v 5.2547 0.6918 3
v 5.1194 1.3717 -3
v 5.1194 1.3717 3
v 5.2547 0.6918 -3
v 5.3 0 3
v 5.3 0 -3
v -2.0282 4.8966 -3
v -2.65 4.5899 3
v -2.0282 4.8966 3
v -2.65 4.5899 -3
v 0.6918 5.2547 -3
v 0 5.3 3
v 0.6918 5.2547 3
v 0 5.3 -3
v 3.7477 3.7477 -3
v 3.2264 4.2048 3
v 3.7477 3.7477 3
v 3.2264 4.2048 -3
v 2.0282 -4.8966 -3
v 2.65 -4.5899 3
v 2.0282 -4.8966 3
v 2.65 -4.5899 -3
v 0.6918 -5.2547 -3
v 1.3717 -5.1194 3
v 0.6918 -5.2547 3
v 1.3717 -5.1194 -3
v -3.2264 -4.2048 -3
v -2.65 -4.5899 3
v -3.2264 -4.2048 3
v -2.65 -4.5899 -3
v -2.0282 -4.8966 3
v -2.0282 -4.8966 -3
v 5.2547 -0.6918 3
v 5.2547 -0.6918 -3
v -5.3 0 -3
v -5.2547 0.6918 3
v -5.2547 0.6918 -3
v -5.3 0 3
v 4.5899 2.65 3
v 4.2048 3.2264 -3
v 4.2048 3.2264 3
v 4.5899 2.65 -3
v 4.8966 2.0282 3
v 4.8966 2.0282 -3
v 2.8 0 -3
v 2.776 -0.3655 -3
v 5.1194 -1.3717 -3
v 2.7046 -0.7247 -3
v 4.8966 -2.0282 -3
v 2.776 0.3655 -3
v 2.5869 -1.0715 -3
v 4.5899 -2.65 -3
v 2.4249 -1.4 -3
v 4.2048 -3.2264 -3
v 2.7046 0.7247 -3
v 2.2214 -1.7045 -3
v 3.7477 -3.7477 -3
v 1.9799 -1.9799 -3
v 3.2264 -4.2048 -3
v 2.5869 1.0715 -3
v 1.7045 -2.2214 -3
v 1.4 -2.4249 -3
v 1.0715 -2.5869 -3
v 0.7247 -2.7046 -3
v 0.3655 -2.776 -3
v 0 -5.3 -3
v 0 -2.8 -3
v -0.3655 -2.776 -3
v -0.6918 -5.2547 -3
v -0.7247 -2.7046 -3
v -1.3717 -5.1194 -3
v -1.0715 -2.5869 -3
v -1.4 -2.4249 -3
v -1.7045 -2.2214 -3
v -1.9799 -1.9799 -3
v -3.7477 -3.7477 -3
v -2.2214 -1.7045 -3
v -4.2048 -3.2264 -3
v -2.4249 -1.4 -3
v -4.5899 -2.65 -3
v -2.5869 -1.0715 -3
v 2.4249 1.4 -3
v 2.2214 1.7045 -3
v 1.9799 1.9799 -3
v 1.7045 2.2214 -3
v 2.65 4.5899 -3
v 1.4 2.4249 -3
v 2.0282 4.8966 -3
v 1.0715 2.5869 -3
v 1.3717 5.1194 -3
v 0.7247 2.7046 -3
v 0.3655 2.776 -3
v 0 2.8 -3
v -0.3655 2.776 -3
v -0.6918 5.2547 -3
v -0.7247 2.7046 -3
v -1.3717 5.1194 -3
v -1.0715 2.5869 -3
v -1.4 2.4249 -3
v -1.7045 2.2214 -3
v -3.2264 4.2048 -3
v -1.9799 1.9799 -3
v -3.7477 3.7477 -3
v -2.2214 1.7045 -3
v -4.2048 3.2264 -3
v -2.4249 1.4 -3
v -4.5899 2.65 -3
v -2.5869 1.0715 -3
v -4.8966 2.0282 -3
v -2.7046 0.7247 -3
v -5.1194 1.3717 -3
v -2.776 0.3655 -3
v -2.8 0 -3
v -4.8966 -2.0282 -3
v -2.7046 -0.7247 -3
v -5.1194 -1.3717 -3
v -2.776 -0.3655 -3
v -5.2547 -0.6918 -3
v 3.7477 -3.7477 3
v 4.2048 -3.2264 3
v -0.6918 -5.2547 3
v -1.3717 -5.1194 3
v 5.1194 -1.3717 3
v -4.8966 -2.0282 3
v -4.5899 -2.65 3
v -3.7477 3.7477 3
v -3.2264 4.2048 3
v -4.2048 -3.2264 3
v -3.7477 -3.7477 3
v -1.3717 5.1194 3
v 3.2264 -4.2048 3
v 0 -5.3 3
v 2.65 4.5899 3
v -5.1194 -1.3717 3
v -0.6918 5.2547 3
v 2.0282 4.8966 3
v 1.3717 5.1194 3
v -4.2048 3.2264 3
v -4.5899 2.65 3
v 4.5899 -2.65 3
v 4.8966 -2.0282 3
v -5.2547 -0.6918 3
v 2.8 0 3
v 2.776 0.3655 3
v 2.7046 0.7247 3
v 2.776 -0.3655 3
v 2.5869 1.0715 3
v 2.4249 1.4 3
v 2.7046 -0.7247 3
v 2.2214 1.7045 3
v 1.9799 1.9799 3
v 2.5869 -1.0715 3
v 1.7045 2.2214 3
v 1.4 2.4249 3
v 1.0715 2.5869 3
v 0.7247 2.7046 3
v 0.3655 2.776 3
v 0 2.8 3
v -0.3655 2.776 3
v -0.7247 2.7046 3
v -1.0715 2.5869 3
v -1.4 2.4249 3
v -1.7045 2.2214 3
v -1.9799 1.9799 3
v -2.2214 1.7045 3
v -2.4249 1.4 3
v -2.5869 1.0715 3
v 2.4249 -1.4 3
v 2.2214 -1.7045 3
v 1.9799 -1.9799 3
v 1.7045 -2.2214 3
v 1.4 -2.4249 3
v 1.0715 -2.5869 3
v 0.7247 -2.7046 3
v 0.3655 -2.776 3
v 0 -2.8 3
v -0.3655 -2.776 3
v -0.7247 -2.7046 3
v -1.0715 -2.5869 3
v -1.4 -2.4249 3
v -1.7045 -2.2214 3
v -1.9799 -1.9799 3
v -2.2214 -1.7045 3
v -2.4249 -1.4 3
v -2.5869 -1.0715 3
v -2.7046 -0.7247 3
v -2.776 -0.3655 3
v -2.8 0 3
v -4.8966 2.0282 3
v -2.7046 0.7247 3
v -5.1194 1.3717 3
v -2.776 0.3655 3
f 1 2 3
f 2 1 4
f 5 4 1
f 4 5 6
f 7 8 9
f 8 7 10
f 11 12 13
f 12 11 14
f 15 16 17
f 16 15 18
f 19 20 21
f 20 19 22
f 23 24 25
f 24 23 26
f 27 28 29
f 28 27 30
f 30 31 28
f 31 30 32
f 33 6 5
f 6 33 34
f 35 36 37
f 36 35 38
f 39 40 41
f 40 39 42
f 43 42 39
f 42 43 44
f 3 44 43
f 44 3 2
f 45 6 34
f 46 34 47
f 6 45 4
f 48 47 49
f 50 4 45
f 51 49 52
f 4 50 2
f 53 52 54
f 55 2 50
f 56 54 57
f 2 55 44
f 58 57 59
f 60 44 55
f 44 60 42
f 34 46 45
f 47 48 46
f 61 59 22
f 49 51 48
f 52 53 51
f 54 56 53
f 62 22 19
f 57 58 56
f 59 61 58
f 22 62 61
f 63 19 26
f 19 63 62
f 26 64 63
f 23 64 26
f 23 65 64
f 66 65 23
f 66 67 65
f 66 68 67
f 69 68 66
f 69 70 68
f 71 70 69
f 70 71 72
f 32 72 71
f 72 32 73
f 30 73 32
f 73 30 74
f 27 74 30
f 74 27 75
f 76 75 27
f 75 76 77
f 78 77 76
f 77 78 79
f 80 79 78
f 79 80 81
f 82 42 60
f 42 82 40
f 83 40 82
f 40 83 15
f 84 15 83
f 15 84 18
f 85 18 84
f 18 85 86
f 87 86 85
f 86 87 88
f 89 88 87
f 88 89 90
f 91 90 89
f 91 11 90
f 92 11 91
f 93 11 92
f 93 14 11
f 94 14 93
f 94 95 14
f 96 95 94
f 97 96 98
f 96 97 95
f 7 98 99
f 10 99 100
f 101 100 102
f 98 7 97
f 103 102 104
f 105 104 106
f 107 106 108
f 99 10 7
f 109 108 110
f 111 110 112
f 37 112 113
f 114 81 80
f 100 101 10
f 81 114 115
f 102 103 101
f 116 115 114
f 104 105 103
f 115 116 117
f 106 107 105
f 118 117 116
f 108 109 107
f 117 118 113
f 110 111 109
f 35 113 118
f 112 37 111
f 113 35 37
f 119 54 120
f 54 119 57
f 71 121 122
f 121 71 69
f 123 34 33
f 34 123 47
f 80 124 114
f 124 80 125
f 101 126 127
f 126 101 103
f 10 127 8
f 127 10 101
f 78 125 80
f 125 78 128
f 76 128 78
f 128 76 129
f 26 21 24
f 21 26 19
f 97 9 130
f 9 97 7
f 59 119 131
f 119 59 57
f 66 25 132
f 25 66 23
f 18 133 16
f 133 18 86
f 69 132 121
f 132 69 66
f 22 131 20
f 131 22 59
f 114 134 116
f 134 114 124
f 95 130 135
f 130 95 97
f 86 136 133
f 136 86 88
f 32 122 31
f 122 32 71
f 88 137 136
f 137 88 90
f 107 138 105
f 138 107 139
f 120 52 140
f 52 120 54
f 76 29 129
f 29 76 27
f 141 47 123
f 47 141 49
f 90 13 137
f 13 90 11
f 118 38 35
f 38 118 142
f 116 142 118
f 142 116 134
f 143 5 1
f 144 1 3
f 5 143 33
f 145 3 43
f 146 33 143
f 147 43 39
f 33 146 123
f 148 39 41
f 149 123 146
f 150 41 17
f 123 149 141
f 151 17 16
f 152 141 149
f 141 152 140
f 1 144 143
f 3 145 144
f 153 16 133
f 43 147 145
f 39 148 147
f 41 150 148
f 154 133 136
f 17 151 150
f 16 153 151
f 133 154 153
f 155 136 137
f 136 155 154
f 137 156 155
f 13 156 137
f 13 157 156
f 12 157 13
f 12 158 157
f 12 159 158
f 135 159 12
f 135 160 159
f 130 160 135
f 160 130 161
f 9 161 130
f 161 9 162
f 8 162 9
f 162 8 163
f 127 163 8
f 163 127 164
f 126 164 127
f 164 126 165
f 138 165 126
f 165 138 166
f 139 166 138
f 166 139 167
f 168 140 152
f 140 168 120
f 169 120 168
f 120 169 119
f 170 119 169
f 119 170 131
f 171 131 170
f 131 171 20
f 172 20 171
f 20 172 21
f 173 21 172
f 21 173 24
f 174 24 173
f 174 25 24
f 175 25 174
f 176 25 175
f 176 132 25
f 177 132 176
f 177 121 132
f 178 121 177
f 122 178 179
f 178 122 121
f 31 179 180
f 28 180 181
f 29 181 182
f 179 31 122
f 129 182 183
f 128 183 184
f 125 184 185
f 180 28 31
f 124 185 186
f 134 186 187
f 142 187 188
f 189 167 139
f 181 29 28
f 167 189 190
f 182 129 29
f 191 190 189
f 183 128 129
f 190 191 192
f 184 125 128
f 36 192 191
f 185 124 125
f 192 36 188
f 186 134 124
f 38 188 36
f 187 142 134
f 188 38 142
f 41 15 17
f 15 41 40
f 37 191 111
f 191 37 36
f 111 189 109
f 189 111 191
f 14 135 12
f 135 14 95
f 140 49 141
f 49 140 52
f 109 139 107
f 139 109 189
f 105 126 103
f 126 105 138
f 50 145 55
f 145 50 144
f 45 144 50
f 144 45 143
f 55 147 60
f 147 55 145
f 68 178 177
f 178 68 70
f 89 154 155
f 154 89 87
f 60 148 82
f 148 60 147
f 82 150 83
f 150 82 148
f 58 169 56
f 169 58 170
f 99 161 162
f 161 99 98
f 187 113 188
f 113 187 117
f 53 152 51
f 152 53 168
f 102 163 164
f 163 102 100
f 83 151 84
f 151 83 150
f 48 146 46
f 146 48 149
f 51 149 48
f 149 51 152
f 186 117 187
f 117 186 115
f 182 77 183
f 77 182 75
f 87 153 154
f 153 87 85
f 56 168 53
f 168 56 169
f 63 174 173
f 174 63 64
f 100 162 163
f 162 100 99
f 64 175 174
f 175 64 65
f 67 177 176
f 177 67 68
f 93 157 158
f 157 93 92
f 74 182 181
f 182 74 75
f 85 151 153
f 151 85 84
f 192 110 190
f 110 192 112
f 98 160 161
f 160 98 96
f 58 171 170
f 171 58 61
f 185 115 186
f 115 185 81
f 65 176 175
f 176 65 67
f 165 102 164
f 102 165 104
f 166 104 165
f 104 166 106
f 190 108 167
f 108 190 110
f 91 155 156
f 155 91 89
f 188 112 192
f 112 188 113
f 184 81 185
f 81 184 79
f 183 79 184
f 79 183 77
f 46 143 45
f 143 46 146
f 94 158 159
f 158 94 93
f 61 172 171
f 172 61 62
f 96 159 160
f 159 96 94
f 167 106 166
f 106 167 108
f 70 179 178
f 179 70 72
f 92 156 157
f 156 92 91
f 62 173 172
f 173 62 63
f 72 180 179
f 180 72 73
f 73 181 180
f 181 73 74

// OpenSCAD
difference()
{
cylinder(h=6,d=5.6+5,center=true,$fn=48);
cylinder(h=8,d=5.6,center=true,$fn=48);
}
